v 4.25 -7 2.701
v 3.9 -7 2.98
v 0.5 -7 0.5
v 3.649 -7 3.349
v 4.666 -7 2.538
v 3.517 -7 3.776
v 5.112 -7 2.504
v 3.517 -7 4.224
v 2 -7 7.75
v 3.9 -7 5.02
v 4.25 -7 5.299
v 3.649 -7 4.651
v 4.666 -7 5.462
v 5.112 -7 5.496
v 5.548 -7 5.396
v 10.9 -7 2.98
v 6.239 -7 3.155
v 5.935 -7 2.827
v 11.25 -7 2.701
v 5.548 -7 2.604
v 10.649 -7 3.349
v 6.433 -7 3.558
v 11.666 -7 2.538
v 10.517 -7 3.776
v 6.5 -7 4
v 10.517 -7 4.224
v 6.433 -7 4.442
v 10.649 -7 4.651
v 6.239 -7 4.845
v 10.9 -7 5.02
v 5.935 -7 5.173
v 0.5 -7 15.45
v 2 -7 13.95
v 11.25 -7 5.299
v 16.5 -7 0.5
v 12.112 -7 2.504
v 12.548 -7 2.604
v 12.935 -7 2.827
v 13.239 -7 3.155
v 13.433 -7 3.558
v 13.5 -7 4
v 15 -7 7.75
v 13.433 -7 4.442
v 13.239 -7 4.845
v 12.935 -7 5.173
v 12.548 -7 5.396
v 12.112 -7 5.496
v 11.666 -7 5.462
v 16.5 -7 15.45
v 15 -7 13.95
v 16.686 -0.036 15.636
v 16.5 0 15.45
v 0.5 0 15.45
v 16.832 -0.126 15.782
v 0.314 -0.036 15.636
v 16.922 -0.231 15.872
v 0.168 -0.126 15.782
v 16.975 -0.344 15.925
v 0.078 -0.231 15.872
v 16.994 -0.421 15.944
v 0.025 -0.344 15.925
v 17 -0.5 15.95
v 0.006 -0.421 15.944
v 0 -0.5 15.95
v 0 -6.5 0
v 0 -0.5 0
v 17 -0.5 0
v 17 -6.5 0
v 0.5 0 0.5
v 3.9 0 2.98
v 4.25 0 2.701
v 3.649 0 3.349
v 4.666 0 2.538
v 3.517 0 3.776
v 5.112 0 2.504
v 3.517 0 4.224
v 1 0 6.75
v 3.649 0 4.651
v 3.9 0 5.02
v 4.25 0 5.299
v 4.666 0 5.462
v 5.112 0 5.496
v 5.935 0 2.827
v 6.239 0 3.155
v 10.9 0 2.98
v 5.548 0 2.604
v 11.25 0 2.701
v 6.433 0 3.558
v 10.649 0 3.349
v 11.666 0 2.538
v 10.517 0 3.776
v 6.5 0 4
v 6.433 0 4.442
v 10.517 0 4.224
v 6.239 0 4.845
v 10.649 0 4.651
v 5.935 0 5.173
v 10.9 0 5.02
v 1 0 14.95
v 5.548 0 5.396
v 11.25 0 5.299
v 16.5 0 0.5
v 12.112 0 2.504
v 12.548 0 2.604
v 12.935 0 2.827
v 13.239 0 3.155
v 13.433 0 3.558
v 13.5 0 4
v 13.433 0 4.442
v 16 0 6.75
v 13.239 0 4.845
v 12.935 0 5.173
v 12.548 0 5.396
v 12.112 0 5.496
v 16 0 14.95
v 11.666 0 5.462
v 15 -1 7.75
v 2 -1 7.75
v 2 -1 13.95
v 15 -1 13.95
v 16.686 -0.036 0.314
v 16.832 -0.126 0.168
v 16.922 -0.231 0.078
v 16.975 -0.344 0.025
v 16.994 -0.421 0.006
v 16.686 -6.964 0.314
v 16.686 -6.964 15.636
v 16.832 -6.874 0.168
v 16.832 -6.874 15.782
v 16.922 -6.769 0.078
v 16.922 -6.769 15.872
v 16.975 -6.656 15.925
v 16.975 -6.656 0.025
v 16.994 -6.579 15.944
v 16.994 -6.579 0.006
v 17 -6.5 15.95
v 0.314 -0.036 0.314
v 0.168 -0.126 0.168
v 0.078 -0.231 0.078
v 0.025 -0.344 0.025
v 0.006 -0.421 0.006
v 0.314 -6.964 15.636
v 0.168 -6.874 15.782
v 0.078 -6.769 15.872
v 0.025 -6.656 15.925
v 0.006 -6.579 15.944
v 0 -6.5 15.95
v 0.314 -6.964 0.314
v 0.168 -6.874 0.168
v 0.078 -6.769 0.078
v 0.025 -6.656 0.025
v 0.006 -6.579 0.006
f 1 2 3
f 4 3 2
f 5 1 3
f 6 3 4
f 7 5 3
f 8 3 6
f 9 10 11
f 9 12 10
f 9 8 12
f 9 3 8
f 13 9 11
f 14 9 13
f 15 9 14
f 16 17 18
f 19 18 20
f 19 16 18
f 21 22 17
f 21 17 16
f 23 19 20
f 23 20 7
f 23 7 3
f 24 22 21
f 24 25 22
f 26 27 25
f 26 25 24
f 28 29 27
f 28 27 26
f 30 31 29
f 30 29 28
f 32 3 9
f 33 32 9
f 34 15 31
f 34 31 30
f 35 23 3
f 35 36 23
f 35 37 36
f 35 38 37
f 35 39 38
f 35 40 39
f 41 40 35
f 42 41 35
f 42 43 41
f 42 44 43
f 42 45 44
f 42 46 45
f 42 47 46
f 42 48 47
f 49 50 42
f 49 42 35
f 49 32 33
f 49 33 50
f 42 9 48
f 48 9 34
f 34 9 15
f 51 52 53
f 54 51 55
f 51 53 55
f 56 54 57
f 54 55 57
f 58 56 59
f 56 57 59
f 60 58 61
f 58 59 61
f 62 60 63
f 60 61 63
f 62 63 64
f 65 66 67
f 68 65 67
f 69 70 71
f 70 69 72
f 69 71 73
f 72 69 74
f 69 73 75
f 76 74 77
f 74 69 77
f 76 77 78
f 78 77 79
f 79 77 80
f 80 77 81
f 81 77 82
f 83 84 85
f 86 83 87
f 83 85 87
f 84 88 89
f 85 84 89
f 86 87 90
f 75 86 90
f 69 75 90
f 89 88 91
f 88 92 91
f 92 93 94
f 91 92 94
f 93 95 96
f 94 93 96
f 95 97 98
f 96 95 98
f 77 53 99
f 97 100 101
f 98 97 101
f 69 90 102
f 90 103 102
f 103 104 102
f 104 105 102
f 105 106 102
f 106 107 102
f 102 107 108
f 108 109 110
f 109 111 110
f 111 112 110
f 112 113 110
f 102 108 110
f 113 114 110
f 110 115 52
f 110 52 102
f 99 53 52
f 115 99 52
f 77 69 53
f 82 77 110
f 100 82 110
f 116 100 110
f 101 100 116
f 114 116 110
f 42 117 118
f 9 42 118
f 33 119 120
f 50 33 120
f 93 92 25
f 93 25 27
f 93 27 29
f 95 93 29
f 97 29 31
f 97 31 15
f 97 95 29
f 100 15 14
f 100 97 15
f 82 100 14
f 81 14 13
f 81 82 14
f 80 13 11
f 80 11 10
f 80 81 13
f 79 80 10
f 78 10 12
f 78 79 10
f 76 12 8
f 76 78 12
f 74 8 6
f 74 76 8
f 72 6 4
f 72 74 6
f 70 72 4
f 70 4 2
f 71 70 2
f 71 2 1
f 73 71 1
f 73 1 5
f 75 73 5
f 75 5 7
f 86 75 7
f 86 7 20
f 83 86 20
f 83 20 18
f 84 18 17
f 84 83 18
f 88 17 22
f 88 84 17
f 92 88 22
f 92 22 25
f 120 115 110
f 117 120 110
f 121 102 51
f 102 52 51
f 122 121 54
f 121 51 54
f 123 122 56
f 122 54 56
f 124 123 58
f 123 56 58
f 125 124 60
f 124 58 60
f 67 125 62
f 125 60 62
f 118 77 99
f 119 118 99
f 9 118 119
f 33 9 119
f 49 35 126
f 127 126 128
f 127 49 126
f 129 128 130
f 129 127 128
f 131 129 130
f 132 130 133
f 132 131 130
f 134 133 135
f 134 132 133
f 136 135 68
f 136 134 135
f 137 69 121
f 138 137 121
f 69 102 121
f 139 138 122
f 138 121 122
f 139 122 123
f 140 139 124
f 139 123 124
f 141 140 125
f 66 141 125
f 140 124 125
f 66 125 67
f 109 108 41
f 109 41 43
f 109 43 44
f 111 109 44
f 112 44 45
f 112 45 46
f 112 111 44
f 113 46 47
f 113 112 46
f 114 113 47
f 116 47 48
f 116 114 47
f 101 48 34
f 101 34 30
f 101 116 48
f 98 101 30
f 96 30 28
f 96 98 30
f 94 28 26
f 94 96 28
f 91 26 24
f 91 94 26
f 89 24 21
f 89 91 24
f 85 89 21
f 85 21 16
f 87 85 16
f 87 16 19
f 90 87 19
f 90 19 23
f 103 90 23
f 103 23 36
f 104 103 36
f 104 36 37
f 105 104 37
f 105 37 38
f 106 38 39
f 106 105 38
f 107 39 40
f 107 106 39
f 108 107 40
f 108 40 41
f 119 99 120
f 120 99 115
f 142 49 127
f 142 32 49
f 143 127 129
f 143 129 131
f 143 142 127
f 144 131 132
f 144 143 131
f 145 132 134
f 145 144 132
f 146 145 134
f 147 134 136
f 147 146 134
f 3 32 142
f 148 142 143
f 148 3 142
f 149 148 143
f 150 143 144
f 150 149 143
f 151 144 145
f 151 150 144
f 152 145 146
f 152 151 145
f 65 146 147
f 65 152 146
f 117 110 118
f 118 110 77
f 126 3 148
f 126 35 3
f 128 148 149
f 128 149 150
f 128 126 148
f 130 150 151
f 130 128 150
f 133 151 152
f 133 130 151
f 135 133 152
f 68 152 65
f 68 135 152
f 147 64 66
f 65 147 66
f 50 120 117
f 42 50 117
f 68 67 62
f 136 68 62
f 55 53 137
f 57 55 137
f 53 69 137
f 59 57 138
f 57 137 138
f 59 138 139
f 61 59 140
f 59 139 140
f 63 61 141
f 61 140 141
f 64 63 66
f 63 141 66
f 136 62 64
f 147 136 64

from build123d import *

# Parameters (mm, degrees)
F0_R     = 1.5
F1_DEPTH = 7
F2_SIZE  = 1
F3_R     = 0.5


with BuildPart() as f1:
    # F0 (on Front) → F1 (new body)
    with BuildSketch(Plane.XZ):
        Polygon((0, 7.75), (0, 0), (17, 0), (17, 7.75), (15, 7.75), (2, 7.75), align=None)
        with Locations((5, 4)):
            Circle(F0_R, mode=Mode.SUBTRACT)
        with Locations((12, 4)):
            Circle(F0_R, mode=Mode.SUBTRACT)
        Polygon((0, 15.95), (0, 7.75), (2, 7.75), (2, 13.95), (15, 13.95), (15, 7.75), (17, 7.75), (17, 15.95), align=None)
    extrude(amount=F1_DEPTH)

    # F2
    f2_edges = [f1.edges().sort_by_distance(p)[0] for p in [
        (8.5, 0, 7.75),
        (2, 0, 10.85),
        (8.5, 0, 13.95),
        (15, 0, 10.85),
    ]]
    chamfer(f2_edges, length=F2_SIZE)

    # F3
    f3_edges = [f1.edges().sort_by_distance(p)[0] for p in [
        (8.5, -7, 0),
        (17, -7, 7.975),
        (8.5, -7, 15.95),
        (0, -7, 7.975),
        (17, 0, 7.975),
        (8.5, 0, 0),
        (0, 0, 7.975),
        (8.5, 0, 15.95),
    ]]
    fillet(f3_edges, radius=F3_R)


solid = f1.part
